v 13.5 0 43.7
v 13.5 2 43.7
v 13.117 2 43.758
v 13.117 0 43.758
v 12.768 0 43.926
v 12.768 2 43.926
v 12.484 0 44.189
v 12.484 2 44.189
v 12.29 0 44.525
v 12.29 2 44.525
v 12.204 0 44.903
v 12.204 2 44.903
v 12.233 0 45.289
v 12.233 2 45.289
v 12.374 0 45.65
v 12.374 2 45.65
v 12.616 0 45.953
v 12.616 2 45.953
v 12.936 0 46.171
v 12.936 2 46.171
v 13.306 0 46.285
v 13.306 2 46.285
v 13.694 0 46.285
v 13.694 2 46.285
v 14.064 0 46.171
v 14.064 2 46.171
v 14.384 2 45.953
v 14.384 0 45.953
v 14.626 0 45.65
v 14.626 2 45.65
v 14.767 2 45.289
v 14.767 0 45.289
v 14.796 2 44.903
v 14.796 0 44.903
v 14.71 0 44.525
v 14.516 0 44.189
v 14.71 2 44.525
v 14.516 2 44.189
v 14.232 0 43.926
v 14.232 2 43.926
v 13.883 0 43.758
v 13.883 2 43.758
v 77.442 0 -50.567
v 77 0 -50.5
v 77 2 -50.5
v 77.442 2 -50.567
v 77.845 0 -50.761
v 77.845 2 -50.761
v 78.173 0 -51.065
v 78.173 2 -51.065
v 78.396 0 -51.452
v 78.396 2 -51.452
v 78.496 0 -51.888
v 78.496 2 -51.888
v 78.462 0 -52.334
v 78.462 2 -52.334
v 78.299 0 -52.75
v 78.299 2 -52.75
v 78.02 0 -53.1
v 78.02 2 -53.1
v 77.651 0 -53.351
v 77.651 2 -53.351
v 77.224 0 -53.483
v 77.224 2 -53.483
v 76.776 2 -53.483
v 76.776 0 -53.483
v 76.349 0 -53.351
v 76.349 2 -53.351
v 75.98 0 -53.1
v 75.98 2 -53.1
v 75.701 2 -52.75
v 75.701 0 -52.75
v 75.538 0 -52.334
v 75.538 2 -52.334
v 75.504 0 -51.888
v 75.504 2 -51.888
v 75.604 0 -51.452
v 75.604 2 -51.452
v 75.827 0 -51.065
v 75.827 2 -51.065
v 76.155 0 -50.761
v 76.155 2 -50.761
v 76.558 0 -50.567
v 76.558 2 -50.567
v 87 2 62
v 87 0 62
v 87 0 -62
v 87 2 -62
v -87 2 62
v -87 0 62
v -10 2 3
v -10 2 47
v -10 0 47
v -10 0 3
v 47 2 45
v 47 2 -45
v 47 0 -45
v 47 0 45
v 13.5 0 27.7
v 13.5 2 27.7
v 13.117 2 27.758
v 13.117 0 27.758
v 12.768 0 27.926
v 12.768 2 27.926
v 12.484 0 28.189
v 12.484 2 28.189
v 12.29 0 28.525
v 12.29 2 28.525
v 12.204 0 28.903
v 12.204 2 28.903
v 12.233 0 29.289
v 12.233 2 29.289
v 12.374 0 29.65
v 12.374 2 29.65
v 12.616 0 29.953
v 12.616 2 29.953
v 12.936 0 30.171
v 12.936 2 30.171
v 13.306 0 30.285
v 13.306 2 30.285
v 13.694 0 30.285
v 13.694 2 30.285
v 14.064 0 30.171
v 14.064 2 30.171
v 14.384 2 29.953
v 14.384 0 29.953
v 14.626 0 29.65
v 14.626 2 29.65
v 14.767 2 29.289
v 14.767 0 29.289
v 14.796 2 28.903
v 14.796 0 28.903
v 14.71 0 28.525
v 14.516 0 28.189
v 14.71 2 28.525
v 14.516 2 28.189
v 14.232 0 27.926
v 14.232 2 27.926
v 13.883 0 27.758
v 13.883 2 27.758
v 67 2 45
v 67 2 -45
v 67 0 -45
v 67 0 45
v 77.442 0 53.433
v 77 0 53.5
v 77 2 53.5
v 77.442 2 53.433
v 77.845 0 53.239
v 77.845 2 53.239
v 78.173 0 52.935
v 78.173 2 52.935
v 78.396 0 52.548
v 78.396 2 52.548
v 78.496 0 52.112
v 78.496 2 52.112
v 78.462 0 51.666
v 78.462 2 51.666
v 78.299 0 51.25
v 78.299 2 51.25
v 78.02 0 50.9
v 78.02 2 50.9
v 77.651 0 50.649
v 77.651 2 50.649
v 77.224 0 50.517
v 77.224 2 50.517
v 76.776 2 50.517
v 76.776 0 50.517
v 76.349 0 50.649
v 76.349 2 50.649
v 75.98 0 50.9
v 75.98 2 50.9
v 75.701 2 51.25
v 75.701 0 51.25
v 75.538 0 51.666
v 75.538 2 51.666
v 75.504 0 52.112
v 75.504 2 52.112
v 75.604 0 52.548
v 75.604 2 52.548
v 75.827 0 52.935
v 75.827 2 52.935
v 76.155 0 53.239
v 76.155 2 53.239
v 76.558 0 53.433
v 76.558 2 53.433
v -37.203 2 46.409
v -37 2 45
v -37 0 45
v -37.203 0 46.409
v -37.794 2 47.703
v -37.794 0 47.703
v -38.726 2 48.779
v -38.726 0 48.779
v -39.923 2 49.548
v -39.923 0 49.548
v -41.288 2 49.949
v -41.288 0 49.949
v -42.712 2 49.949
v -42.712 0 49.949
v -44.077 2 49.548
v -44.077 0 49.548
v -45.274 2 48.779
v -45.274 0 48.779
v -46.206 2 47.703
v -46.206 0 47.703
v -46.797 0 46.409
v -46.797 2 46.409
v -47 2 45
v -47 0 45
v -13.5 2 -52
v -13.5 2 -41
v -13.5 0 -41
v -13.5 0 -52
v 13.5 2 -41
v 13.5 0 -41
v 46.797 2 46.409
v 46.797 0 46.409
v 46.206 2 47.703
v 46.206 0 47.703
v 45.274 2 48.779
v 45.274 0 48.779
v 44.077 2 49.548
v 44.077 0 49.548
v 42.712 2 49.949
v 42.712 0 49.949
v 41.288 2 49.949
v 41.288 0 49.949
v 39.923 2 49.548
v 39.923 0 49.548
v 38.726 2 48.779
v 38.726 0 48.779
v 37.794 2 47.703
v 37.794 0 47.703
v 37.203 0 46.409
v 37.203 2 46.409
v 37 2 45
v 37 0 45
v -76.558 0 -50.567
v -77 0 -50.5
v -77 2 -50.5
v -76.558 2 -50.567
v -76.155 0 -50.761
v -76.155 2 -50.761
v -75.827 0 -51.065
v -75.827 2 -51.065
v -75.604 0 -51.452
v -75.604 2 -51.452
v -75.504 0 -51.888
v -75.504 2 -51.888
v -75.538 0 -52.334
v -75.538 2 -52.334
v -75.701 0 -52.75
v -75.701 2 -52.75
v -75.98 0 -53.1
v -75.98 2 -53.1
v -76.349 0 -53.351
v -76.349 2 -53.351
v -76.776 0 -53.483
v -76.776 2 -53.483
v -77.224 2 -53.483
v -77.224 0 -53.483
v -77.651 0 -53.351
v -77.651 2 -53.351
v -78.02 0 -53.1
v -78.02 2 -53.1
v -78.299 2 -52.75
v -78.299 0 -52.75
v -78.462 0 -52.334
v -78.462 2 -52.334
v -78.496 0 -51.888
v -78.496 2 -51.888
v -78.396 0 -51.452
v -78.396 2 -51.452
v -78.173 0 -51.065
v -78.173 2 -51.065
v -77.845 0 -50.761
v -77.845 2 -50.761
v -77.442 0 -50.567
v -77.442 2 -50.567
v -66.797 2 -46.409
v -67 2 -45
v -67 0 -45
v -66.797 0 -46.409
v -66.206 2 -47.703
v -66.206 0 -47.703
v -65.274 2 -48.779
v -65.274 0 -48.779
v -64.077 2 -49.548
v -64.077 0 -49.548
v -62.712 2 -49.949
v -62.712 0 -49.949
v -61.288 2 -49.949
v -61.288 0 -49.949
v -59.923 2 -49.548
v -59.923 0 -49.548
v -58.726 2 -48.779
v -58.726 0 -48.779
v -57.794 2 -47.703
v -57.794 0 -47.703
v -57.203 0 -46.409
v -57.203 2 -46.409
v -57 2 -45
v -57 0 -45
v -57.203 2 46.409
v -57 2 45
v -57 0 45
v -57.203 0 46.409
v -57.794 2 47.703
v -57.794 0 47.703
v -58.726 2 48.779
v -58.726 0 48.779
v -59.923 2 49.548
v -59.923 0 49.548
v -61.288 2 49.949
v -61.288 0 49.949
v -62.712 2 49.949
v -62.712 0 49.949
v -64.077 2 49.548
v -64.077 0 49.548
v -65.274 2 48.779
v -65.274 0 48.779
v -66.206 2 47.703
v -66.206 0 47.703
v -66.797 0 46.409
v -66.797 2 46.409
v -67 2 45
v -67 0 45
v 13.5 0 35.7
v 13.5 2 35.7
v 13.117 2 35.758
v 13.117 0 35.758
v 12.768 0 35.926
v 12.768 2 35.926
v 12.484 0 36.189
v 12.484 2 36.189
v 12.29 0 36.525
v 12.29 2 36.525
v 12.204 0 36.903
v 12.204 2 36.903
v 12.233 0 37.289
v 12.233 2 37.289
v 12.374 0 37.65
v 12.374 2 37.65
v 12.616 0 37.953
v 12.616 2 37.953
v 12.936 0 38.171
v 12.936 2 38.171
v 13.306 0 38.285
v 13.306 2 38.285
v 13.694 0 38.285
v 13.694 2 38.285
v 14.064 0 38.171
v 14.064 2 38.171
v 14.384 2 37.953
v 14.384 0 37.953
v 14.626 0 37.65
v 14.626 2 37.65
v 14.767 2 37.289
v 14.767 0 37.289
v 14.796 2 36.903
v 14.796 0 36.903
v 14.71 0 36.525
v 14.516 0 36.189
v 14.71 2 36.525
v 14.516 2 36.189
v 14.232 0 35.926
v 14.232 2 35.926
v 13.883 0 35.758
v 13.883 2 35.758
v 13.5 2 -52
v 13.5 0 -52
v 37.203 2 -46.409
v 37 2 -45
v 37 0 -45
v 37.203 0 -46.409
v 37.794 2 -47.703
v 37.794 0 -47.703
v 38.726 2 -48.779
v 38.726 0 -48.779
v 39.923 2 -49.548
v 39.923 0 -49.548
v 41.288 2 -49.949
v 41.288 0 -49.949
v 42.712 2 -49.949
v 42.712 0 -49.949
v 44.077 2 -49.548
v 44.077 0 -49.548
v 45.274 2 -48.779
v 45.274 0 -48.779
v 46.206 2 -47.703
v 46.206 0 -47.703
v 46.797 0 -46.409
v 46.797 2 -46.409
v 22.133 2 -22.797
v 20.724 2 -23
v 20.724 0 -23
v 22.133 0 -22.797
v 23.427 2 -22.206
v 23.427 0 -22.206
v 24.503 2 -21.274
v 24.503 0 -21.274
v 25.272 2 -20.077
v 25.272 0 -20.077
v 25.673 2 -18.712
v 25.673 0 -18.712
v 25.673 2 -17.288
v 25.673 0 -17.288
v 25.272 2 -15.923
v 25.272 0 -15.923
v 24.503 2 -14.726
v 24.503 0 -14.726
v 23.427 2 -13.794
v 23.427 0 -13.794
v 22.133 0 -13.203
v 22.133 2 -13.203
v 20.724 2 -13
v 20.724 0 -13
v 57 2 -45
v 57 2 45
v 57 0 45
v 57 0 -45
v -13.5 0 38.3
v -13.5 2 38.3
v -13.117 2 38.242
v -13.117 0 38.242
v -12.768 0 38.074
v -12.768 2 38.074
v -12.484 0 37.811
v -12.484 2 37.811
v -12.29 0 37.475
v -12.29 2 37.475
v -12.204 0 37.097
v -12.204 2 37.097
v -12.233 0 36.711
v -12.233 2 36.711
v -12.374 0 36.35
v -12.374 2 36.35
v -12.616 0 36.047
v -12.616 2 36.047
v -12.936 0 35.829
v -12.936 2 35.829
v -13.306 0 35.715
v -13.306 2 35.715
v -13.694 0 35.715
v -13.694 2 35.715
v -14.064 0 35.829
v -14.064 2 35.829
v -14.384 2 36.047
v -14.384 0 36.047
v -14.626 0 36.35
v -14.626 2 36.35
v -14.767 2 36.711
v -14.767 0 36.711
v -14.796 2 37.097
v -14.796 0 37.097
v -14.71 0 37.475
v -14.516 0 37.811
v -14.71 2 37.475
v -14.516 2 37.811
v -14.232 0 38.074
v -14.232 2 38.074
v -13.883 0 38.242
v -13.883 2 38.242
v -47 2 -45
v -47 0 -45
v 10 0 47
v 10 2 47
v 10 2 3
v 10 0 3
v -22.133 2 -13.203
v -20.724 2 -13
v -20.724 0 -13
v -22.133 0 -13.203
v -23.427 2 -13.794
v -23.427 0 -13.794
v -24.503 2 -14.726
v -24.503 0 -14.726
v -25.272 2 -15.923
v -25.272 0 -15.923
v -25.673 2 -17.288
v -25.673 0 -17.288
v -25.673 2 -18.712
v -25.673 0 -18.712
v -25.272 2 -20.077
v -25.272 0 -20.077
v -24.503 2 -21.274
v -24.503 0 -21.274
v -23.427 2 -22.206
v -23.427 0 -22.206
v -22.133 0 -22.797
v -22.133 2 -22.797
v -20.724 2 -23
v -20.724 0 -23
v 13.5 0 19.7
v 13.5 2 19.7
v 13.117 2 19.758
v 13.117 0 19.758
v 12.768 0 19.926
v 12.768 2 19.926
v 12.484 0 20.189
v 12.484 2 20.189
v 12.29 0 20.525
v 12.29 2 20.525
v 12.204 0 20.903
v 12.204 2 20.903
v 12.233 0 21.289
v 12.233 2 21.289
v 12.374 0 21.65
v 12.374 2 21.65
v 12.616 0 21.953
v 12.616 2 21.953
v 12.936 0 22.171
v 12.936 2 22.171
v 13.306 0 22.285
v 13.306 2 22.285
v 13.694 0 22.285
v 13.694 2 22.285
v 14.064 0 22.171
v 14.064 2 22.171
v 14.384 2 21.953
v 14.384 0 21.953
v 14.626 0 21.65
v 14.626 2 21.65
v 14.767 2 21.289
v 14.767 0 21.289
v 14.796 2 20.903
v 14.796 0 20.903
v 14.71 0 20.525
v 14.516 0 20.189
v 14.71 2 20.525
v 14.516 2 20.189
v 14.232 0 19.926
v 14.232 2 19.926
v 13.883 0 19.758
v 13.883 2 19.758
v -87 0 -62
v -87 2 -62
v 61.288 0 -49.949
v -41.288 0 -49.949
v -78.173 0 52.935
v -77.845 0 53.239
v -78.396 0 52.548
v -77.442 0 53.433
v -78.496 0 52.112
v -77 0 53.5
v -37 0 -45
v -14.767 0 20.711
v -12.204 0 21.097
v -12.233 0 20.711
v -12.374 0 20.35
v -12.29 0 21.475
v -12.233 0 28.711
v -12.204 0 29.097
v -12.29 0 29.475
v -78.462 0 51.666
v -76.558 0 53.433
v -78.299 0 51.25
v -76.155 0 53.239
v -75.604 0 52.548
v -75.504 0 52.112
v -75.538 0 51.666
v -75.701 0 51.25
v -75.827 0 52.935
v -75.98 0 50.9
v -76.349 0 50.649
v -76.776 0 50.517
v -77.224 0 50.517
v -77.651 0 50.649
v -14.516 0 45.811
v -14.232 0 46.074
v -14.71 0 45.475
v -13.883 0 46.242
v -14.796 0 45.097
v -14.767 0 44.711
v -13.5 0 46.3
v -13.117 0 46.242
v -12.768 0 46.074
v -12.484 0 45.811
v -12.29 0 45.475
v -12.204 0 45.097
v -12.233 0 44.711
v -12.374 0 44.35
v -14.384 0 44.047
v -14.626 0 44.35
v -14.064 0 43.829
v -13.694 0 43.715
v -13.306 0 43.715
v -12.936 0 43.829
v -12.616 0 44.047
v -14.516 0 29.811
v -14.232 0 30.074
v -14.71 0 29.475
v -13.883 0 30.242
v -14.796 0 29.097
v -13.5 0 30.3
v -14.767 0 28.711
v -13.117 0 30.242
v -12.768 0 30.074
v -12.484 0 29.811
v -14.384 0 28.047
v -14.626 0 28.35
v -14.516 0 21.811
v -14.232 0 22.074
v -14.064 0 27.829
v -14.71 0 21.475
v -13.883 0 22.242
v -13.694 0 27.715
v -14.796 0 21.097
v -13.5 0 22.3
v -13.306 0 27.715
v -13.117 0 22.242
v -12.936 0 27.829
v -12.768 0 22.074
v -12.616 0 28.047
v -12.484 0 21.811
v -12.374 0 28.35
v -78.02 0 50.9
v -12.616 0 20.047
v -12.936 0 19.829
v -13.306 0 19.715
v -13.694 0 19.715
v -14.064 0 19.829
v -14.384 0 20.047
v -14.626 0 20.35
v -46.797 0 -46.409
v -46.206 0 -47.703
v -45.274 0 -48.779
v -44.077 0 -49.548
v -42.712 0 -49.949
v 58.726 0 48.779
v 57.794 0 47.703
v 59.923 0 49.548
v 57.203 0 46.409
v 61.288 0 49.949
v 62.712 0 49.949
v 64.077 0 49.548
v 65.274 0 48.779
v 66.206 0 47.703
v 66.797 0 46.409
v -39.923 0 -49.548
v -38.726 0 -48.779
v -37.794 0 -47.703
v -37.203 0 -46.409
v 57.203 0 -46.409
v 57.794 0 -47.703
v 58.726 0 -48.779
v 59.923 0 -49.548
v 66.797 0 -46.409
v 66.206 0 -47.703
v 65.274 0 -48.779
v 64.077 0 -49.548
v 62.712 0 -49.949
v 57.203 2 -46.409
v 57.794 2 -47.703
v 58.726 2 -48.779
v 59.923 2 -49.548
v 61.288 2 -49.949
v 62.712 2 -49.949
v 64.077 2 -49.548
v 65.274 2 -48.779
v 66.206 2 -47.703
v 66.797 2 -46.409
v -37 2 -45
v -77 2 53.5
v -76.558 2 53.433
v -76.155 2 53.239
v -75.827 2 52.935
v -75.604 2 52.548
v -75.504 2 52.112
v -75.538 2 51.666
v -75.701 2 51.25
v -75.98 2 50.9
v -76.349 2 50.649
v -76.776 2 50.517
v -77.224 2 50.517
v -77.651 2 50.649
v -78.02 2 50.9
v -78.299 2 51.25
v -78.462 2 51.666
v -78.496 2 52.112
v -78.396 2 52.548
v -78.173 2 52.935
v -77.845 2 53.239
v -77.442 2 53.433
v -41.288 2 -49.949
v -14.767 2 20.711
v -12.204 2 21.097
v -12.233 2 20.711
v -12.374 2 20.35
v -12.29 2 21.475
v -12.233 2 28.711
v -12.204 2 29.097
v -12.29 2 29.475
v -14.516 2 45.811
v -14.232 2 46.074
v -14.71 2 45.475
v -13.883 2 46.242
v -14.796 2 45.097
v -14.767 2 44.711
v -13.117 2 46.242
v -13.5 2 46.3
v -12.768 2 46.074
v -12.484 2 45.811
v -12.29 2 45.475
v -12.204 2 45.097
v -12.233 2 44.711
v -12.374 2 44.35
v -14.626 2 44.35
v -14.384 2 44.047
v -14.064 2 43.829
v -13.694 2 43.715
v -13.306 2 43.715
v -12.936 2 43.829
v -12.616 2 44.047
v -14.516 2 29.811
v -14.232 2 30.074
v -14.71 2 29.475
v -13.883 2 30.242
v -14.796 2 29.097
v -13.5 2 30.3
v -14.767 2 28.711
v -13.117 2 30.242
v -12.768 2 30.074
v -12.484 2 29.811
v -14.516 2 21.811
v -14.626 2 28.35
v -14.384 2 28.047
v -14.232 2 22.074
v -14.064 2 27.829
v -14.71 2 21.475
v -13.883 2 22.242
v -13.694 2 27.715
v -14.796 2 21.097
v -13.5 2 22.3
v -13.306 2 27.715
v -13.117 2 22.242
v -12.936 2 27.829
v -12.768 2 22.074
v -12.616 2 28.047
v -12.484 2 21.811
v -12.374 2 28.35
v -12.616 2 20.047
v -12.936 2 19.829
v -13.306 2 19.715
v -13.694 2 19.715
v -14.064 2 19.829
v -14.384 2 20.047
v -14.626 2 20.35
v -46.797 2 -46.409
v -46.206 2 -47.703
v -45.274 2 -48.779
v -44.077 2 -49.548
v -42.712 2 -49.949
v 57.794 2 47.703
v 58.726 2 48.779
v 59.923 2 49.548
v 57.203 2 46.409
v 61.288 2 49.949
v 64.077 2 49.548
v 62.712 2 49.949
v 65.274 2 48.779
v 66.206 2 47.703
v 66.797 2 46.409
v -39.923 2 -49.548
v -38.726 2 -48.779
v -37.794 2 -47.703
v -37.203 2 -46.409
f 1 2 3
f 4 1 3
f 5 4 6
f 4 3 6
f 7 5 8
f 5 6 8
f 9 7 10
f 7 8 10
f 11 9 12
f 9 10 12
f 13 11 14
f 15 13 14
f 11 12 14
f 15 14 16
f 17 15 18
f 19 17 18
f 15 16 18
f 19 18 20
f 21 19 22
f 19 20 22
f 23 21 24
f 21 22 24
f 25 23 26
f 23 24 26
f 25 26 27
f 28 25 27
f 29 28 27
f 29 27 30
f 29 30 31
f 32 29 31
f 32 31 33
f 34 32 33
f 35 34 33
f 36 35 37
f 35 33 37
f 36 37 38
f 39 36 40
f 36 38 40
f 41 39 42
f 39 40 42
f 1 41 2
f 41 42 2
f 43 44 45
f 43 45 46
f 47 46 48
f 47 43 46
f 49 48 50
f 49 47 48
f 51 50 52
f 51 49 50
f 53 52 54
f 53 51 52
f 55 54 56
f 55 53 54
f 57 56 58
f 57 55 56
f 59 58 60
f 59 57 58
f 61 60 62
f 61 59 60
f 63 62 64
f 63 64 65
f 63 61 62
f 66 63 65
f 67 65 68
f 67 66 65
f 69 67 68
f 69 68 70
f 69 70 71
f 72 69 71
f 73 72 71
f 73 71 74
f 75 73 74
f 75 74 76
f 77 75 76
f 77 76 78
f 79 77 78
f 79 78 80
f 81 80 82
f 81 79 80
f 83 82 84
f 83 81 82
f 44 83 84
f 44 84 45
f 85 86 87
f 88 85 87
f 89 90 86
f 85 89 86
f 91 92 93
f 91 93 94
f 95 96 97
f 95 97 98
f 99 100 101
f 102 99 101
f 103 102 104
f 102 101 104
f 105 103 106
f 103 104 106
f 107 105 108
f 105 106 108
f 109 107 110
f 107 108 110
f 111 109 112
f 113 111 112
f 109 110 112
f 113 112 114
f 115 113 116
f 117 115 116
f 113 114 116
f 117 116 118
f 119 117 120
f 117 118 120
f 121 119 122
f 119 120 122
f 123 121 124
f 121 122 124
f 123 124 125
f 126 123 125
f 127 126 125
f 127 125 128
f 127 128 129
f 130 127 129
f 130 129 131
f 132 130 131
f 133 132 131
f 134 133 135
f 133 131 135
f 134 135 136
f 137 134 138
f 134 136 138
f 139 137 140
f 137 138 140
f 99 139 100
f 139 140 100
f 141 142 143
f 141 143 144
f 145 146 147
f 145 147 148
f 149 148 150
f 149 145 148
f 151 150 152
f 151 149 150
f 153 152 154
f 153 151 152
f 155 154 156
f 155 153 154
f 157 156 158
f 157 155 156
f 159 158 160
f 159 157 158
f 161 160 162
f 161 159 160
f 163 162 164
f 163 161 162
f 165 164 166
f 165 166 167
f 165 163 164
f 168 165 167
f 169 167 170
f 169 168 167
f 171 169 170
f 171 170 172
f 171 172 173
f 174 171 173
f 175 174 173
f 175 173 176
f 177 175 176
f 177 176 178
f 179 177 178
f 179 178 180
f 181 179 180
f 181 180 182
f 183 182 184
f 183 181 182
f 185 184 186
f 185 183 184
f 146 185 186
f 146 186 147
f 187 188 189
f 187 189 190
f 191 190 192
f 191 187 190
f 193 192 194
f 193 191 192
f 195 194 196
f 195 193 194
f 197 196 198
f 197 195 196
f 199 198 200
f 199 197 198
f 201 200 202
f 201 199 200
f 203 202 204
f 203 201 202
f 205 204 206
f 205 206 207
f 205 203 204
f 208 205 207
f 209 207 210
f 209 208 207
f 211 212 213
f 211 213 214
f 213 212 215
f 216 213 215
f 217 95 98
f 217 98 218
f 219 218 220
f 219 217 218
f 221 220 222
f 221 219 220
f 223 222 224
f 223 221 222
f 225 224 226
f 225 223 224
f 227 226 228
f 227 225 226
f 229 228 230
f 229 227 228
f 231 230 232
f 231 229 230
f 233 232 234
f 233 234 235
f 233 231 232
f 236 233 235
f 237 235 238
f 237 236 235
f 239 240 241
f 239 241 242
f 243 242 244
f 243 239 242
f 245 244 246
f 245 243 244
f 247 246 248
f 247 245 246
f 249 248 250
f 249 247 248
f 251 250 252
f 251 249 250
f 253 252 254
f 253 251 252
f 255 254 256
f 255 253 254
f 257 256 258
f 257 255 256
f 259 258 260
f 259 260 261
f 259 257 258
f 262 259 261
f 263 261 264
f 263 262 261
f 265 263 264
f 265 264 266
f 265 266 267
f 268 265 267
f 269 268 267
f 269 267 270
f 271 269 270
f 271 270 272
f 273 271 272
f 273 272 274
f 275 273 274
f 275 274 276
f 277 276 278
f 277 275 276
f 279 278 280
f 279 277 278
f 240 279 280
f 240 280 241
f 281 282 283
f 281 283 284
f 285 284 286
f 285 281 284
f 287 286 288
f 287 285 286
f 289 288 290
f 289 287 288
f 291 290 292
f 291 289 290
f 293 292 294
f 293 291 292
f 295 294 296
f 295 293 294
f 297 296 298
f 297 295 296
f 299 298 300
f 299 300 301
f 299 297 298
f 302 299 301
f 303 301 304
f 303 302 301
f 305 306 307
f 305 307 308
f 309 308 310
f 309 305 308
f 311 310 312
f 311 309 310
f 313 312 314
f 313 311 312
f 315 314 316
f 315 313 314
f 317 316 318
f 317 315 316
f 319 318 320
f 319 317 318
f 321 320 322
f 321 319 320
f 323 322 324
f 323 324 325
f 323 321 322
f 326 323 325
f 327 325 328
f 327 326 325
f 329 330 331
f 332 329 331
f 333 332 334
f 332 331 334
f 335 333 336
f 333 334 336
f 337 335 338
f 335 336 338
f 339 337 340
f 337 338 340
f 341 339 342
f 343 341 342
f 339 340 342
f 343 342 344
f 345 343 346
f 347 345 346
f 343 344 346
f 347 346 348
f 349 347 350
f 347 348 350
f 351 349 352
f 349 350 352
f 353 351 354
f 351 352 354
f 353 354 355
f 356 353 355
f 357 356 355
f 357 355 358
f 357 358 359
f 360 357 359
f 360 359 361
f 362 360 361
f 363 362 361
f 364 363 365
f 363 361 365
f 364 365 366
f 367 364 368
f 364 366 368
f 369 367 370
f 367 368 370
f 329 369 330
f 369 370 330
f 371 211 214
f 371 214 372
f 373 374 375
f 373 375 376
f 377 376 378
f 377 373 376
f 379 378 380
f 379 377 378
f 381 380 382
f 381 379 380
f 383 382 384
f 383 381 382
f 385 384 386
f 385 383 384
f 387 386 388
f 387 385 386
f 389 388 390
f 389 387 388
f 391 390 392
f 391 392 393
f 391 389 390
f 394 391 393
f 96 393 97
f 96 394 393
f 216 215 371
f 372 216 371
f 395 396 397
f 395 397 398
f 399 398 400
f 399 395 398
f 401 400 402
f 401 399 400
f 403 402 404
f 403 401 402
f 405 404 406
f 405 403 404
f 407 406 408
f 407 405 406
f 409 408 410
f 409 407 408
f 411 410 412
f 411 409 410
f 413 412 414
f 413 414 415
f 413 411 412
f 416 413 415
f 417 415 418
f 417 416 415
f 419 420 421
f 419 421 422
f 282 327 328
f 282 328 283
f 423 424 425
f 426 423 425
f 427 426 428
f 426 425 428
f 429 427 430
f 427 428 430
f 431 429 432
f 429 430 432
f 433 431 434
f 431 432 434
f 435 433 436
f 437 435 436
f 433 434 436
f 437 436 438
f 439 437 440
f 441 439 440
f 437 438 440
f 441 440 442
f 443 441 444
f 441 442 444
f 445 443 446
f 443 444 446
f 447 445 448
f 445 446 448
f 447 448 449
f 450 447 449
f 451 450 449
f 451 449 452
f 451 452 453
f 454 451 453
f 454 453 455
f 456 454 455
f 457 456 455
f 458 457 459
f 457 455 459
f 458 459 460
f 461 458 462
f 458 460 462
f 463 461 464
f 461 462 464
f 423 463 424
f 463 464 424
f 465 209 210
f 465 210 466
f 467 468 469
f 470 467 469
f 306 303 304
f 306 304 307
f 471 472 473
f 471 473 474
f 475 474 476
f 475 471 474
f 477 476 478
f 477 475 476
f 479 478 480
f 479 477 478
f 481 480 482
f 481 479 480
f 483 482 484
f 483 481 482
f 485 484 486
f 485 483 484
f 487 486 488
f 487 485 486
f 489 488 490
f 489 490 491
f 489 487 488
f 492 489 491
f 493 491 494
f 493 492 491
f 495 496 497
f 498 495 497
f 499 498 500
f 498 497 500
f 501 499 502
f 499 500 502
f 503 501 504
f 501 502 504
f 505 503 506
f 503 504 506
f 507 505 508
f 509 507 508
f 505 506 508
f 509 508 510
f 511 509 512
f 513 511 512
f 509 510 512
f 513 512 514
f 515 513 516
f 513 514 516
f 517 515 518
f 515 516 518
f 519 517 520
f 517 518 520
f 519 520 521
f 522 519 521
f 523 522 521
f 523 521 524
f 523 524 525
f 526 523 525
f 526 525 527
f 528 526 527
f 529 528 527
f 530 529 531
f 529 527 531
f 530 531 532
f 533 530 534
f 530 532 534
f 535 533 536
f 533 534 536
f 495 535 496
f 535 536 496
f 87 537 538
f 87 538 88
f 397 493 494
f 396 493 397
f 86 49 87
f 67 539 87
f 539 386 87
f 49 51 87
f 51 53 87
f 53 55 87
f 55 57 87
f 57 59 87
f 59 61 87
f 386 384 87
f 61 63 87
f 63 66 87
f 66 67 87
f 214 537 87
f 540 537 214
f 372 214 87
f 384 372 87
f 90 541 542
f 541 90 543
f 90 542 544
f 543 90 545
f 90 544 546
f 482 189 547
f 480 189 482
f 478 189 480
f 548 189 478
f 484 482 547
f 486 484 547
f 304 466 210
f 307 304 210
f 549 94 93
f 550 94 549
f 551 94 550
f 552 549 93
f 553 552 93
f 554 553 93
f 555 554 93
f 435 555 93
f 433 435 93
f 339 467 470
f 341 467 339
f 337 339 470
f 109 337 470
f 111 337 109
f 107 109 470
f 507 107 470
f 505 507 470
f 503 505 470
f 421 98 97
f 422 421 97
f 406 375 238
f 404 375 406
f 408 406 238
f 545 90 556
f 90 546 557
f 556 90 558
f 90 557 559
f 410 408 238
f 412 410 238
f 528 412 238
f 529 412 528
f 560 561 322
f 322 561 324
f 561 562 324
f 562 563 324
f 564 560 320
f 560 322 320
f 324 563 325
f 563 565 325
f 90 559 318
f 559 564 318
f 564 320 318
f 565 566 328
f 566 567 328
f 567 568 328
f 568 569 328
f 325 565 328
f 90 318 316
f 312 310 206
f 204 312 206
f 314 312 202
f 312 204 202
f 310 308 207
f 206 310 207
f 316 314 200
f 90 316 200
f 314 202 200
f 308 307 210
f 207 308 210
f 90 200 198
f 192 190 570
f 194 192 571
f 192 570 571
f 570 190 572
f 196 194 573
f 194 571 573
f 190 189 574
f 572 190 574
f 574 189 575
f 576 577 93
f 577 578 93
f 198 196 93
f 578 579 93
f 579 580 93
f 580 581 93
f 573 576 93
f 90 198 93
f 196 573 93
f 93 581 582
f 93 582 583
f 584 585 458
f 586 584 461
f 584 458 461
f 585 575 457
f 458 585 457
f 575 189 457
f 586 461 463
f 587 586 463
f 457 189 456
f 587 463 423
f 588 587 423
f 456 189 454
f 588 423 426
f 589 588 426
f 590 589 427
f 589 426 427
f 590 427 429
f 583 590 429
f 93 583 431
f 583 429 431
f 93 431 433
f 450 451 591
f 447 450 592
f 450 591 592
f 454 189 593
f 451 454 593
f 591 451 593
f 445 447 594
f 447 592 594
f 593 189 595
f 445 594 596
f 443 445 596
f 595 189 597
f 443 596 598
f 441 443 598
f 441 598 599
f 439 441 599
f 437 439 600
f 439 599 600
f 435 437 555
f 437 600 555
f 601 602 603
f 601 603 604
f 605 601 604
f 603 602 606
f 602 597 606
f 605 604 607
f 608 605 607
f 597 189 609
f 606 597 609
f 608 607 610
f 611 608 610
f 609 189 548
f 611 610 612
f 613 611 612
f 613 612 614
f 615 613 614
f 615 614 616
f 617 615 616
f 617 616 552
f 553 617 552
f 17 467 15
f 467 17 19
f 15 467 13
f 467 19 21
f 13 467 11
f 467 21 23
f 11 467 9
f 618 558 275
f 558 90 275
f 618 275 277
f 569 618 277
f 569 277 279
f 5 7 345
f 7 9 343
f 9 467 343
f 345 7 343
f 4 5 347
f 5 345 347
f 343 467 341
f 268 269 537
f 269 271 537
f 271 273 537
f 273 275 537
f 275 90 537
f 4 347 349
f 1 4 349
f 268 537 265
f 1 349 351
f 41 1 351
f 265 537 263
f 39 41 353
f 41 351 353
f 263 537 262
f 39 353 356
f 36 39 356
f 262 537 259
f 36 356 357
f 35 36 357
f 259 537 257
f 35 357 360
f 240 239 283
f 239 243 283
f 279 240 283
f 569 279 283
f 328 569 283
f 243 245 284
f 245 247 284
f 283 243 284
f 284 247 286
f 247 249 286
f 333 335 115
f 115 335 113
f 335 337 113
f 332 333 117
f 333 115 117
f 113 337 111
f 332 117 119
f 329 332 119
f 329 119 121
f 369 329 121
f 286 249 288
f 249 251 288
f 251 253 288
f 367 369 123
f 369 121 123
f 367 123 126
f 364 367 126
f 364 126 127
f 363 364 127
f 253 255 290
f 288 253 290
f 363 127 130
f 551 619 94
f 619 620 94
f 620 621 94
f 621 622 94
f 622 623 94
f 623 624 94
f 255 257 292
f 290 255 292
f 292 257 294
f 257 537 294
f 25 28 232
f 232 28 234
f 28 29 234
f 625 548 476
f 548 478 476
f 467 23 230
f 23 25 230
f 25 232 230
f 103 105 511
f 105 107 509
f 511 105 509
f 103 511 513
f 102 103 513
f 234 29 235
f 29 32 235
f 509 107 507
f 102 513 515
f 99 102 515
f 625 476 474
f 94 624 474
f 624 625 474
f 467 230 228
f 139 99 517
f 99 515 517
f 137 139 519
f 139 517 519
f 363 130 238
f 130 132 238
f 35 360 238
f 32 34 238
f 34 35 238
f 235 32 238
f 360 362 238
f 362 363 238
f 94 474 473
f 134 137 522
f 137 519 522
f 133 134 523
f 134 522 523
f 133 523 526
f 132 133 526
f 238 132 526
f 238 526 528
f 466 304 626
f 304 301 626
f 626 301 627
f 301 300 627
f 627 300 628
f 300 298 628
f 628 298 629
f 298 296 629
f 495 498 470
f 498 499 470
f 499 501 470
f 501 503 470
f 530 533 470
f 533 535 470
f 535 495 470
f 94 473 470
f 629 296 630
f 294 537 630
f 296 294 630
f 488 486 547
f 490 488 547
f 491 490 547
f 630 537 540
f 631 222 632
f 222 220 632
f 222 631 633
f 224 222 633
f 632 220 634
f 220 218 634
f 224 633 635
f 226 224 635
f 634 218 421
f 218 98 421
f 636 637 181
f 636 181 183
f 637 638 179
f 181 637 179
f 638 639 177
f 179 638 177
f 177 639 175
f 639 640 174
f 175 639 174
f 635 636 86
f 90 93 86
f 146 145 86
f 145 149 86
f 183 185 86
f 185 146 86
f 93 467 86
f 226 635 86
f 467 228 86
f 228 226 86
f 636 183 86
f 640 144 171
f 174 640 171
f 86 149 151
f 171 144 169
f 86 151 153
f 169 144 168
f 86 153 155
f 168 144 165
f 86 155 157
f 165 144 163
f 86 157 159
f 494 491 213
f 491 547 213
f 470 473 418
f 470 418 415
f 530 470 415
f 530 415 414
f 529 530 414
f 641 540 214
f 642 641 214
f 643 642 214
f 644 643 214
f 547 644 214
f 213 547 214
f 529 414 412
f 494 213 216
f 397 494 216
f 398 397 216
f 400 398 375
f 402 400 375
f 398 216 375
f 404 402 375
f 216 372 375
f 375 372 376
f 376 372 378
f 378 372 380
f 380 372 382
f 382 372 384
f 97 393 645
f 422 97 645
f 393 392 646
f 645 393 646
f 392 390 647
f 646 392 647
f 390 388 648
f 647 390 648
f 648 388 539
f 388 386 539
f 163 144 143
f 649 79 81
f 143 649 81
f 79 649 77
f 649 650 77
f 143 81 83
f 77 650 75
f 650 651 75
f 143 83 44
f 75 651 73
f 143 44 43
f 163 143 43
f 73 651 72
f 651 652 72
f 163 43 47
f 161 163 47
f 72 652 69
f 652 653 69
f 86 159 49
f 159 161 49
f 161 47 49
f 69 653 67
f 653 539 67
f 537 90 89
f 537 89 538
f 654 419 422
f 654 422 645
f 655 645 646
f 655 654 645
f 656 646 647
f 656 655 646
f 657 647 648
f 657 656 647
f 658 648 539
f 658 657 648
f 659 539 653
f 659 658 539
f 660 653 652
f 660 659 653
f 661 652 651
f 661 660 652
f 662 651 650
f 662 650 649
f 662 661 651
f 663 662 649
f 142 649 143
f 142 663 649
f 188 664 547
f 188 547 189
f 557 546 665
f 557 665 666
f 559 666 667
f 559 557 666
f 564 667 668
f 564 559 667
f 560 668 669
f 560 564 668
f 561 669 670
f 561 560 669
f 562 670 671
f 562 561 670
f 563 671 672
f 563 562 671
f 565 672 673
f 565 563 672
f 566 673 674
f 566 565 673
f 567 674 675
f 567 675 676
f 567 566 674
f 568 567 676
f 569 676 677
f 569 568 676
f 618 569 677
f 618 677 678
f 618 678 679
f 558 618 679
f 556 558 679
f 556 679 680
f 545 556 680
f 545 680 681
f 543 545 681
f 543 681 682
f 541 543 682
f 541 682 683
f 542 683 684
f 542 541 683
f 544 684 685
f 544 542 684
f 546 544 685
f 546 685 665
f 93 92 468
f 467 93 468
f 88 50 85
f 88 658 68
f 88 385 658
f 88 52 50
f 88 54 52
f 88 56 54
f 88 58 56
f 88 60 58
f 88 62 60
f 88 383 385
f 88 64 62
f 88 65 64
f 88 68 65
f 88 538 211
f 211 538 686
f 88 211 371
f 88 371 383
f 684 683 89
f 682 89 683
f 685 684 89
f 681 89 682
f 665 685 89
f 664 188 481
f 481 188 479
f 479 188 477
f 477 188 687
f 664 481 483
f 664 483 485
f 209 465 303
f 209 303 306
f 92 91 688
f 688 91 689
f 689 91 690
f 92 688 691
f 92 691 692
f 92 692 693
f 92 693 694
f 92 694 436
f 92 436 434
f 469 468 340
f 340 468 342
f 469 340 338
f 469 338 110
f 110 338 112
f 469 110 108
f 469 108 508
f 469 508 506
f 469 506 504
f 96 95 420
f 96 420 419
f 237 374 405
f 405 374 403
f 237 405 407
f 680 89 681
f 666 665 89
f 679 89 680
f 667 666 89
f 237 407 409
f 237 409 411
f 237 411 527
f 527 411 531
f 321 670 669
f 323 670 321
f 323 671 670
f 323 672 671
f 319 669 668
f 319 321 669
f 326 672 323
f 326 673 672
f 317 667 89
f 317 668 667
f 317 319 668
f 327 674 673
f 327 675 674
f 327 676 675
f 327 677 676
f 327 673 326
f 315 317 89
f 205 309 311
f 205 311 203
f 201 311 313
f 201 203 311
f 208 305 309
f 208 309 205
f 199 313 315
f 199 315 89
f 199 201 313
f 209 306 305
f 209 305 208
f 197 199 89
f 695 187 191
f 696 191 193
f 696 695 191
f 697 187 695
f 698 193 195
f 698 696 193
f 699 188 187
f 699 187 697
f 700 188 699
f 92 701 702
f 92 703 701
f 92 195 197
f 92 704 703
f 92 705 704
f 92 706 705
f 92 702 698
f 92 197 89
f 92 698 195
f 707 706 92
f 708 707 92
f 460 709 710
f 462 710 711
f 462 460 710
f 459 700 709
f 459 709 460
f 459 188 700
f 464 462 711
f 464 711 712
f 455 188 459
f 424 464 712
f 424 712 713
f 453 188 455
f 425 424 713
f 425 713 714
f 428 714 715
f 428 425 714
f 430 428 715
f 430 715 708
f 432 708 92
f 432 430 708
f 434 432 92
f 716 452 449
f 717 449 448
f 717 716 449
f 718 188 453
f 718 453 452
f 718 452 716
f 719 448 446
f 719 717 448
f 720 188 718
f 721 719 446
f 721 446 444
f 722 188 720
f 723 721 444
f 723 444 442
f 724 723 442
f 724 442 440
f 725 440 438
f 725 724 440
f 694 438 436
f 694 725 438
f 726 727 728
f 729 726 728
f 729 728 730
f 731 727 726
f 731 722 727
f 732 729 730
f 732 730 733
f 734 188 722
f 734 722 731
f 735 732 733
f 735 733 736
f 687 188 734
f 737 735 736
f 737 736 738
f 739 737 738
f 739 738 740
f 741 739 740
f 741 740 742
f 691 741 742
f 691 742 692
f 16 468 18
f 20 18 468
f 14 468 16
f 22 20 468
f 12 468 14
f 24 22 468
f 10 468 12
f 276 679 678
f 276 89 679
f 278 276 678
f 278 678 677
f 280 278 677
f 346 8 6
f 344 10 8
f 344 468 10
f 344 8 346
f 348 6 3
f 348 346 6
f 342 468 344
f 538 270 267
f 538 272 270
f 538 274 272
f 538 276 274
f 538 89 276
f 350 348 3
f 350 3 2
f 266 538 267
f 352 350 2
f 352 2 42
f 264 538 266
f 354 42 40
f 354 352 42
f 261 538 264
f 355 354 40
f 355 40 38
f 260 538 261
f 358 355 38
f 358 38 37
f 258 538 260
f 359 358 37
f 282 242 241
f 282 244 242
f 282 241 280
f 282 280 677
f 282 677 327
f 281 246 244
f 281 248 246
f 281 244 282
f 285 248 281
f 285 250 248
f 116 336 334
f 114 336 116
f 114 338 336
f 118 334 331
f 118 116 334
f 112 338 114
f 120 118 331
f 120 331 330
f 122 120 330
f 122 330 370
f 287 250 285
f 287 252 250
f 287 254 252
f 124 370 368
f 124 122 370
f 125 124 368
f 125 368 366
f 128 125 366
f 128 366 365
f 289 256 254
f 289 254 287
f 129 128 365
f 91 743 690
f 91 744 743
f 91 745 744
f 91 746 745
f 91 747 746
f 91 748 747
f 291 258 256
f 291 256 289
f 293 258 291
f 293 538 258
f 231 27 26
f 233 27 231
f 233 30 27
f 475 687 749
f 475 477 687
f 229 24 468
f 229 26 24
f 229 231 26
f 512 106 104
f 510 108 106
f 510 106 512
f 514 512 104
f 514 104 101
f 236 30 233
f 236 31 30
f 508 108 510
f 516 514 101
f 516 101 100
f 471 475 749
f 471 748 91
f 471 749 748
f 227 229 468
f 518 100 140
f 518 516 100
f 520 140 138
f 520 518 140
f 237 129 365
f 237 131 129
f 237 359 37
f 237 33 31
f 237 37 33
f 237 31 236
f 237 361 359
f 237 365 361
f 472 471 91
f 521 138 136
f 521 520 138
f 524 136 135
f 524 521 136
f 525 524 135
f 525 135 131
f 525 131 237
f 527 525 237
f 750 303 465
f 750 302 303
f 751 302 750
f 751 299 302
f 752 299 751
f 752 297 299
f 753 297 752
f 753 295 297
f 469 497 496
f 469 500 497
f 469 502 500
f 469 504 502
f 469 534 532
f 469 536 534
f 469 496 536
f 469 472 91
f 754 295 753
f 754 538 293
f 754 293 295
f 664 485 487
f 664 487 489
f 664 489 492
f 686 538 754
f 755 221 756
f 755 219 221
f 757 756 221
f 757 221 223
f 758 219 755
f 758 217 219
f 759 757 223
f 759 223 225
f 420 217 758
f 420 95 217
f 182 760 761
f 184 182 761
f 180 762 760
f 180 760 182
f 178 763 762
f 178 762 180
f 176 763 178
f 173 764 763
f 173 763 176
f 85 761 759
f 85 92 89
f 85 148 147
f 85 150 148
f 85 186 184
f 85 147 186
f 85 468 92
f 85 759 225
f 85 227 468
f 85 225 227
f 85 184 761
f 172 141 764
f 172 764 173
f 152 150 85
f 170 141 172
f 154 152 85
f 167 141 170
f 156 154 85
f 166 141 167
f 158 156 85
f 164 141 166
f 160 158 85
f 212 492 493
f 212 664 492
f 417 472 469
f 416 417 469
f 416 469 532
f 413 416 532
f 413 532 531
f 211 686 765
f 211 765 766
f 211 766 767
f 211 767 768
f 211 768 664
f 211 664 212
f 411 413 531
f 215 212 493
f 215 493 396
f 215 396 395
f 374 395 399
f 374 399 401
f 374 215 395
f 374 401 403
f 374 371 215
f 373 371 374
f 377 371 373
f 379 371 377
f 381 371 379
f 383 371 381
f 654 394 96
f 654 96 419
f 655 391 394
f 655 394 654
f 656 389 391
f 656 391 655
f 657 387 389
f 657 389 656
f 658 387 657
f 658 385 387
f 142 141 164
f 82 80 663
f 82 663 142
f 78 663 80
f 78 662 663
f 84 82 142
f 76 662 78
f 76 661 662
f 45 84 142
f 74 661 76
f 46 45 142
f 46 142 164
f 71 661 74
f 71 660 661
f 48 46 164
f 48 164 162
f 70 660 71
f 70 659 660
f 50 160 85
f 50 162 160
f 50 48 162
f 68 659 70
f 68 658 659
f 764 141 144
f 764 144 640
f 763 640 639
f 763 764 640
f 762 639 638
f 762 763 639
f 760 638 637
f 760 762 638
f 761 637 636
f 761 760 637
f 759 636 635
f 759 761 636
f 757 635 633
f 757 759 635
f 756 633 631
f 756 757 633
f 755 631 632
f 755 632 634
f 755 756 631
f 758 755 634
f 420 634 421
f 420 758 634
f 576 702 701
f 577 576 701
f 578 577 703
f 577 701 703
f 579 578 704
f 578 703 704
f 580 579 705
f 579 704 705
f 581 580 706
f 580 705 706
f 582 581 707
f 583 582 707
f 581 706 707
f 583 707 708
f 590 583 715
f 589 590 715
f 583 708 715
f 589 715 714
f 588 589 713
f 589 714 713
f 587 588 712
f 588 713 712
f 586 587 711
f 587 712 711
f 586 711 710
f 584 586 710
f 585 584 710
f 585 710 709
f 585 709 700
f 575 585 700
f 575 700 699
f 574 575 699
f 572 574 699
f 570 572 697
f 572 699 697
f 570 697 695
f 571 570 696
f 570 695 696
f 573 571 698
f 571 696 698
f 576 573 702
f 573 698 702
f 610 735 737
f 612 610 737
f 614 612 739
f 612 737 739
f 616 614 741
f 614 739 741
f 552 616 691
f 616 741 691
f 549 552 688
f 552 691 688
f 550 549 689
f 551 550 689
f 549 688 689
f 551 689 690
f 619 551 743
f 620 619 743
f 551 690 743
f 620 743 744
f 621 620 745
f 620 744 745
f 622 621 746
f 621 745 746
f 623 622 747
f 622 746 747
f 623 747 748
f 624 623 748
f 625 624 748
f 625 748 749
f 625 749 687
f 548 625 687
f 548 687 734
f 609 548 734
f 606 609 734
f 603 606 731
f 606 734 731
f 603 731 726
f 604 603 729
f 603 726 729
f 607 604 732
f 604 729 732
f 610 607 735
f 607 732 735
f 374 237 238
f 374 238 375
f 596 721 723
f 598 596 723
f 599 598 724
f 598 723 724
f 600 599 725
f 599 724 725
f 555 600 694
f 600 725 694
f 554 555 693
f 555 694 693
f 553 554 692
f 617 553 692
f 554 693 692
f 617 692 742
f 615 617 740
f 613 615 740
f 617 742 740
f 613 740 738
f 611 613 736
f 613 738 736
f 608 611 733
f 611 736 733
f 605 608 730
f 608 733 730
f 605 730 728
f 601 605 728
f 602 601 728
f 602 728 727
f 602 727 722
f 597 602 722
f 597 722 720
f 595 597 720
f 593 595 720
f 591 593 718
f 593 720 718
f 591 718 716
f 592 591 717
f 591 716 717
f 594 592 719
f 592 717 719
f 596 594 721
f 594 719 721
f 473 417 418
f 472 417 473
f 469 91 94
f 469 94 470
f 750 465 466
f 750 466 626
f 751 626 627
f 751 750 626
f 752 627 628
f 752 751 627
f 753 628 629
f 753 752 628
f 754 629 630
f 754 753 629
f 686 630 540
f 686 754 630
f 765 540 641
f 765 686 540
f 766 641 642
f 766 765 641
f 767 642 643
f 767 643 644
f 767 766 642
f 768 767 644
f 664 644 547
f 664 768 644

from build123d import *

# Parameters (mm, degrees)
ESBO_O1_W                = 174
ESBO_O1_H                = 124
ESBO_O1_R                = 1.5
RESSALTO_EXTRUS_O1_DEPTH = 2
ESBO_O2_R                = 1.3
ESBO_O2_W                = 20
ESBO_O2_H                = 44
ESBO_O2_W_2              = 27
ESBO_O2_H_2              = 11
CORTE_EXTRUS_O1_DEPTH    = 2


with BuildPart() as part:
    # Esboço1 → Ressalto-extrusão1 (new body)
    with BuildSketch(Plane(origin=(0, 0, 0), x_dir=(1, 0, 0), z_dir=(0, 1, 0))):
        Rectangle(ESBO_O1_W, ESBO_O1_H)
        with Locations(Location((-77, 52, 0), (0, 0, 270))):
            Circle(ESBO_O1_R, mode=Mode.SUBTRACT)
        with Locations(Location((-77, -52, 0), (0, 0, 270))):
            Circle(ESBO_O1_R, mode=Mode.SUBTRACT)
        with Locations(Location((77, -52, 0), (0, 0, 270))):
            Circle(ESBO_O1_R, mode=Mode.SUBTRACT)
        with Locations(Location((77, 52, 0), (0, 0, 270))):
            Circle(ESBO_O1_R, mode=Mode.SUBTRACT)
    extrude(amount=RESSALTO_EXTRUS_O1_DEPTH)

    # Esboço2 → Corte-extrusão1 (cut)
    with BuildSketch(Plane(origin=(0, 2, 0), x_dir=(1, 0, 0), z_dir=(0, 1, 0))):
        with Locations(Location((-13.5, -21, 0), (0, 0, 270))):
            Circle(ESBO_O2_R)
        with Locations(Location((-13.5, -29, 0), (0, 0, 270))):
            Circle(ESBO_O2_R)
        with Locations(Location((-13.5, -37, 0), (0, 0, 270))):
            Circle(ESBO_O2_R)
        with Locations(Location((-13.5, -45, 0), (0, 0, 270))):
            Circle(ESBO_O2_R)
        with Locations(Location((13.5, -37, 0), (0, 0, 90))):
            Circle(ESBO_O2_R)
        with Locations(Location((13.5, -45, 0), (0, 0, 90))):
            Circle(ESBO_O2_R)
        with Locations(Location((13.5, -29, 0), (0, 0, 90))):
            Circle(ESBO_O2_R)
        with Locations(Location((13.5, -21, 0), (0, 0, 90))):
            Circle(ESBO_O2_R)
        with Locations((0, -25)):
            Rectangle(ESBO_O2_W, ESBO_O2_H)
        with BuildLine():
            Line((-37, 45), (-37, -45))
            ThreePointArc((-37, -45), (-42, -50), (-47, -45))
            Line((-47, -45), (-47, 45))
            ThreePointArc((-47, 45), (-42, 50), (-37, 45))
        make_face()
        with BuildLine():
            Line((-57, 45), (-57, -45))
            ThreePointArc((-57, -45), (-62, -50), (-67, -45))
            Line((-67, -45), (-67, 45))
            ThreePointArc((-67, 45), (-62, 50), (-57, 45))
        make_face()
        with BuildLine():
            Line((47, 45), (47, -45))
            ThreePointArc((47, -45), (42, -50), (37, -45))
            Line((37, -45), (37, 45))
            ThreePointArc((37, 45), (42, 50), (47, 45))
        make_face()
        with BuildLine():
            Line((67, 45), (67, -45))
            ThreePointArc((67, -45), (62, -50), (57, -45))
            Line((57, -45), (57, 45))
            ThreePointArc((57, 45), (62, 50), (67, 45))
        make_face()
        with BuildLine():
            Line((-20.724176636, 23), (20.724176636, 23))
            ThreePointArc((20.724176636, 23), (25.724176636, 18), (20.724176636, 13))
            Line((20.724176636, 13), (-20.724176636, 13))
            ThreePointArc((-20.724176636, 13), (-25.724176636, 18), (-20.724176636, 23))
        make_face()
        with Locations((0, 46.5)):
            Rectangle(ESBO_O2_W_2, ESBO_O2_H_2)
    extrude(amount=-CORTE_EXTRUS_O1_DEPTH, mode=Mode.SUBTRACT)


solid = part.part
